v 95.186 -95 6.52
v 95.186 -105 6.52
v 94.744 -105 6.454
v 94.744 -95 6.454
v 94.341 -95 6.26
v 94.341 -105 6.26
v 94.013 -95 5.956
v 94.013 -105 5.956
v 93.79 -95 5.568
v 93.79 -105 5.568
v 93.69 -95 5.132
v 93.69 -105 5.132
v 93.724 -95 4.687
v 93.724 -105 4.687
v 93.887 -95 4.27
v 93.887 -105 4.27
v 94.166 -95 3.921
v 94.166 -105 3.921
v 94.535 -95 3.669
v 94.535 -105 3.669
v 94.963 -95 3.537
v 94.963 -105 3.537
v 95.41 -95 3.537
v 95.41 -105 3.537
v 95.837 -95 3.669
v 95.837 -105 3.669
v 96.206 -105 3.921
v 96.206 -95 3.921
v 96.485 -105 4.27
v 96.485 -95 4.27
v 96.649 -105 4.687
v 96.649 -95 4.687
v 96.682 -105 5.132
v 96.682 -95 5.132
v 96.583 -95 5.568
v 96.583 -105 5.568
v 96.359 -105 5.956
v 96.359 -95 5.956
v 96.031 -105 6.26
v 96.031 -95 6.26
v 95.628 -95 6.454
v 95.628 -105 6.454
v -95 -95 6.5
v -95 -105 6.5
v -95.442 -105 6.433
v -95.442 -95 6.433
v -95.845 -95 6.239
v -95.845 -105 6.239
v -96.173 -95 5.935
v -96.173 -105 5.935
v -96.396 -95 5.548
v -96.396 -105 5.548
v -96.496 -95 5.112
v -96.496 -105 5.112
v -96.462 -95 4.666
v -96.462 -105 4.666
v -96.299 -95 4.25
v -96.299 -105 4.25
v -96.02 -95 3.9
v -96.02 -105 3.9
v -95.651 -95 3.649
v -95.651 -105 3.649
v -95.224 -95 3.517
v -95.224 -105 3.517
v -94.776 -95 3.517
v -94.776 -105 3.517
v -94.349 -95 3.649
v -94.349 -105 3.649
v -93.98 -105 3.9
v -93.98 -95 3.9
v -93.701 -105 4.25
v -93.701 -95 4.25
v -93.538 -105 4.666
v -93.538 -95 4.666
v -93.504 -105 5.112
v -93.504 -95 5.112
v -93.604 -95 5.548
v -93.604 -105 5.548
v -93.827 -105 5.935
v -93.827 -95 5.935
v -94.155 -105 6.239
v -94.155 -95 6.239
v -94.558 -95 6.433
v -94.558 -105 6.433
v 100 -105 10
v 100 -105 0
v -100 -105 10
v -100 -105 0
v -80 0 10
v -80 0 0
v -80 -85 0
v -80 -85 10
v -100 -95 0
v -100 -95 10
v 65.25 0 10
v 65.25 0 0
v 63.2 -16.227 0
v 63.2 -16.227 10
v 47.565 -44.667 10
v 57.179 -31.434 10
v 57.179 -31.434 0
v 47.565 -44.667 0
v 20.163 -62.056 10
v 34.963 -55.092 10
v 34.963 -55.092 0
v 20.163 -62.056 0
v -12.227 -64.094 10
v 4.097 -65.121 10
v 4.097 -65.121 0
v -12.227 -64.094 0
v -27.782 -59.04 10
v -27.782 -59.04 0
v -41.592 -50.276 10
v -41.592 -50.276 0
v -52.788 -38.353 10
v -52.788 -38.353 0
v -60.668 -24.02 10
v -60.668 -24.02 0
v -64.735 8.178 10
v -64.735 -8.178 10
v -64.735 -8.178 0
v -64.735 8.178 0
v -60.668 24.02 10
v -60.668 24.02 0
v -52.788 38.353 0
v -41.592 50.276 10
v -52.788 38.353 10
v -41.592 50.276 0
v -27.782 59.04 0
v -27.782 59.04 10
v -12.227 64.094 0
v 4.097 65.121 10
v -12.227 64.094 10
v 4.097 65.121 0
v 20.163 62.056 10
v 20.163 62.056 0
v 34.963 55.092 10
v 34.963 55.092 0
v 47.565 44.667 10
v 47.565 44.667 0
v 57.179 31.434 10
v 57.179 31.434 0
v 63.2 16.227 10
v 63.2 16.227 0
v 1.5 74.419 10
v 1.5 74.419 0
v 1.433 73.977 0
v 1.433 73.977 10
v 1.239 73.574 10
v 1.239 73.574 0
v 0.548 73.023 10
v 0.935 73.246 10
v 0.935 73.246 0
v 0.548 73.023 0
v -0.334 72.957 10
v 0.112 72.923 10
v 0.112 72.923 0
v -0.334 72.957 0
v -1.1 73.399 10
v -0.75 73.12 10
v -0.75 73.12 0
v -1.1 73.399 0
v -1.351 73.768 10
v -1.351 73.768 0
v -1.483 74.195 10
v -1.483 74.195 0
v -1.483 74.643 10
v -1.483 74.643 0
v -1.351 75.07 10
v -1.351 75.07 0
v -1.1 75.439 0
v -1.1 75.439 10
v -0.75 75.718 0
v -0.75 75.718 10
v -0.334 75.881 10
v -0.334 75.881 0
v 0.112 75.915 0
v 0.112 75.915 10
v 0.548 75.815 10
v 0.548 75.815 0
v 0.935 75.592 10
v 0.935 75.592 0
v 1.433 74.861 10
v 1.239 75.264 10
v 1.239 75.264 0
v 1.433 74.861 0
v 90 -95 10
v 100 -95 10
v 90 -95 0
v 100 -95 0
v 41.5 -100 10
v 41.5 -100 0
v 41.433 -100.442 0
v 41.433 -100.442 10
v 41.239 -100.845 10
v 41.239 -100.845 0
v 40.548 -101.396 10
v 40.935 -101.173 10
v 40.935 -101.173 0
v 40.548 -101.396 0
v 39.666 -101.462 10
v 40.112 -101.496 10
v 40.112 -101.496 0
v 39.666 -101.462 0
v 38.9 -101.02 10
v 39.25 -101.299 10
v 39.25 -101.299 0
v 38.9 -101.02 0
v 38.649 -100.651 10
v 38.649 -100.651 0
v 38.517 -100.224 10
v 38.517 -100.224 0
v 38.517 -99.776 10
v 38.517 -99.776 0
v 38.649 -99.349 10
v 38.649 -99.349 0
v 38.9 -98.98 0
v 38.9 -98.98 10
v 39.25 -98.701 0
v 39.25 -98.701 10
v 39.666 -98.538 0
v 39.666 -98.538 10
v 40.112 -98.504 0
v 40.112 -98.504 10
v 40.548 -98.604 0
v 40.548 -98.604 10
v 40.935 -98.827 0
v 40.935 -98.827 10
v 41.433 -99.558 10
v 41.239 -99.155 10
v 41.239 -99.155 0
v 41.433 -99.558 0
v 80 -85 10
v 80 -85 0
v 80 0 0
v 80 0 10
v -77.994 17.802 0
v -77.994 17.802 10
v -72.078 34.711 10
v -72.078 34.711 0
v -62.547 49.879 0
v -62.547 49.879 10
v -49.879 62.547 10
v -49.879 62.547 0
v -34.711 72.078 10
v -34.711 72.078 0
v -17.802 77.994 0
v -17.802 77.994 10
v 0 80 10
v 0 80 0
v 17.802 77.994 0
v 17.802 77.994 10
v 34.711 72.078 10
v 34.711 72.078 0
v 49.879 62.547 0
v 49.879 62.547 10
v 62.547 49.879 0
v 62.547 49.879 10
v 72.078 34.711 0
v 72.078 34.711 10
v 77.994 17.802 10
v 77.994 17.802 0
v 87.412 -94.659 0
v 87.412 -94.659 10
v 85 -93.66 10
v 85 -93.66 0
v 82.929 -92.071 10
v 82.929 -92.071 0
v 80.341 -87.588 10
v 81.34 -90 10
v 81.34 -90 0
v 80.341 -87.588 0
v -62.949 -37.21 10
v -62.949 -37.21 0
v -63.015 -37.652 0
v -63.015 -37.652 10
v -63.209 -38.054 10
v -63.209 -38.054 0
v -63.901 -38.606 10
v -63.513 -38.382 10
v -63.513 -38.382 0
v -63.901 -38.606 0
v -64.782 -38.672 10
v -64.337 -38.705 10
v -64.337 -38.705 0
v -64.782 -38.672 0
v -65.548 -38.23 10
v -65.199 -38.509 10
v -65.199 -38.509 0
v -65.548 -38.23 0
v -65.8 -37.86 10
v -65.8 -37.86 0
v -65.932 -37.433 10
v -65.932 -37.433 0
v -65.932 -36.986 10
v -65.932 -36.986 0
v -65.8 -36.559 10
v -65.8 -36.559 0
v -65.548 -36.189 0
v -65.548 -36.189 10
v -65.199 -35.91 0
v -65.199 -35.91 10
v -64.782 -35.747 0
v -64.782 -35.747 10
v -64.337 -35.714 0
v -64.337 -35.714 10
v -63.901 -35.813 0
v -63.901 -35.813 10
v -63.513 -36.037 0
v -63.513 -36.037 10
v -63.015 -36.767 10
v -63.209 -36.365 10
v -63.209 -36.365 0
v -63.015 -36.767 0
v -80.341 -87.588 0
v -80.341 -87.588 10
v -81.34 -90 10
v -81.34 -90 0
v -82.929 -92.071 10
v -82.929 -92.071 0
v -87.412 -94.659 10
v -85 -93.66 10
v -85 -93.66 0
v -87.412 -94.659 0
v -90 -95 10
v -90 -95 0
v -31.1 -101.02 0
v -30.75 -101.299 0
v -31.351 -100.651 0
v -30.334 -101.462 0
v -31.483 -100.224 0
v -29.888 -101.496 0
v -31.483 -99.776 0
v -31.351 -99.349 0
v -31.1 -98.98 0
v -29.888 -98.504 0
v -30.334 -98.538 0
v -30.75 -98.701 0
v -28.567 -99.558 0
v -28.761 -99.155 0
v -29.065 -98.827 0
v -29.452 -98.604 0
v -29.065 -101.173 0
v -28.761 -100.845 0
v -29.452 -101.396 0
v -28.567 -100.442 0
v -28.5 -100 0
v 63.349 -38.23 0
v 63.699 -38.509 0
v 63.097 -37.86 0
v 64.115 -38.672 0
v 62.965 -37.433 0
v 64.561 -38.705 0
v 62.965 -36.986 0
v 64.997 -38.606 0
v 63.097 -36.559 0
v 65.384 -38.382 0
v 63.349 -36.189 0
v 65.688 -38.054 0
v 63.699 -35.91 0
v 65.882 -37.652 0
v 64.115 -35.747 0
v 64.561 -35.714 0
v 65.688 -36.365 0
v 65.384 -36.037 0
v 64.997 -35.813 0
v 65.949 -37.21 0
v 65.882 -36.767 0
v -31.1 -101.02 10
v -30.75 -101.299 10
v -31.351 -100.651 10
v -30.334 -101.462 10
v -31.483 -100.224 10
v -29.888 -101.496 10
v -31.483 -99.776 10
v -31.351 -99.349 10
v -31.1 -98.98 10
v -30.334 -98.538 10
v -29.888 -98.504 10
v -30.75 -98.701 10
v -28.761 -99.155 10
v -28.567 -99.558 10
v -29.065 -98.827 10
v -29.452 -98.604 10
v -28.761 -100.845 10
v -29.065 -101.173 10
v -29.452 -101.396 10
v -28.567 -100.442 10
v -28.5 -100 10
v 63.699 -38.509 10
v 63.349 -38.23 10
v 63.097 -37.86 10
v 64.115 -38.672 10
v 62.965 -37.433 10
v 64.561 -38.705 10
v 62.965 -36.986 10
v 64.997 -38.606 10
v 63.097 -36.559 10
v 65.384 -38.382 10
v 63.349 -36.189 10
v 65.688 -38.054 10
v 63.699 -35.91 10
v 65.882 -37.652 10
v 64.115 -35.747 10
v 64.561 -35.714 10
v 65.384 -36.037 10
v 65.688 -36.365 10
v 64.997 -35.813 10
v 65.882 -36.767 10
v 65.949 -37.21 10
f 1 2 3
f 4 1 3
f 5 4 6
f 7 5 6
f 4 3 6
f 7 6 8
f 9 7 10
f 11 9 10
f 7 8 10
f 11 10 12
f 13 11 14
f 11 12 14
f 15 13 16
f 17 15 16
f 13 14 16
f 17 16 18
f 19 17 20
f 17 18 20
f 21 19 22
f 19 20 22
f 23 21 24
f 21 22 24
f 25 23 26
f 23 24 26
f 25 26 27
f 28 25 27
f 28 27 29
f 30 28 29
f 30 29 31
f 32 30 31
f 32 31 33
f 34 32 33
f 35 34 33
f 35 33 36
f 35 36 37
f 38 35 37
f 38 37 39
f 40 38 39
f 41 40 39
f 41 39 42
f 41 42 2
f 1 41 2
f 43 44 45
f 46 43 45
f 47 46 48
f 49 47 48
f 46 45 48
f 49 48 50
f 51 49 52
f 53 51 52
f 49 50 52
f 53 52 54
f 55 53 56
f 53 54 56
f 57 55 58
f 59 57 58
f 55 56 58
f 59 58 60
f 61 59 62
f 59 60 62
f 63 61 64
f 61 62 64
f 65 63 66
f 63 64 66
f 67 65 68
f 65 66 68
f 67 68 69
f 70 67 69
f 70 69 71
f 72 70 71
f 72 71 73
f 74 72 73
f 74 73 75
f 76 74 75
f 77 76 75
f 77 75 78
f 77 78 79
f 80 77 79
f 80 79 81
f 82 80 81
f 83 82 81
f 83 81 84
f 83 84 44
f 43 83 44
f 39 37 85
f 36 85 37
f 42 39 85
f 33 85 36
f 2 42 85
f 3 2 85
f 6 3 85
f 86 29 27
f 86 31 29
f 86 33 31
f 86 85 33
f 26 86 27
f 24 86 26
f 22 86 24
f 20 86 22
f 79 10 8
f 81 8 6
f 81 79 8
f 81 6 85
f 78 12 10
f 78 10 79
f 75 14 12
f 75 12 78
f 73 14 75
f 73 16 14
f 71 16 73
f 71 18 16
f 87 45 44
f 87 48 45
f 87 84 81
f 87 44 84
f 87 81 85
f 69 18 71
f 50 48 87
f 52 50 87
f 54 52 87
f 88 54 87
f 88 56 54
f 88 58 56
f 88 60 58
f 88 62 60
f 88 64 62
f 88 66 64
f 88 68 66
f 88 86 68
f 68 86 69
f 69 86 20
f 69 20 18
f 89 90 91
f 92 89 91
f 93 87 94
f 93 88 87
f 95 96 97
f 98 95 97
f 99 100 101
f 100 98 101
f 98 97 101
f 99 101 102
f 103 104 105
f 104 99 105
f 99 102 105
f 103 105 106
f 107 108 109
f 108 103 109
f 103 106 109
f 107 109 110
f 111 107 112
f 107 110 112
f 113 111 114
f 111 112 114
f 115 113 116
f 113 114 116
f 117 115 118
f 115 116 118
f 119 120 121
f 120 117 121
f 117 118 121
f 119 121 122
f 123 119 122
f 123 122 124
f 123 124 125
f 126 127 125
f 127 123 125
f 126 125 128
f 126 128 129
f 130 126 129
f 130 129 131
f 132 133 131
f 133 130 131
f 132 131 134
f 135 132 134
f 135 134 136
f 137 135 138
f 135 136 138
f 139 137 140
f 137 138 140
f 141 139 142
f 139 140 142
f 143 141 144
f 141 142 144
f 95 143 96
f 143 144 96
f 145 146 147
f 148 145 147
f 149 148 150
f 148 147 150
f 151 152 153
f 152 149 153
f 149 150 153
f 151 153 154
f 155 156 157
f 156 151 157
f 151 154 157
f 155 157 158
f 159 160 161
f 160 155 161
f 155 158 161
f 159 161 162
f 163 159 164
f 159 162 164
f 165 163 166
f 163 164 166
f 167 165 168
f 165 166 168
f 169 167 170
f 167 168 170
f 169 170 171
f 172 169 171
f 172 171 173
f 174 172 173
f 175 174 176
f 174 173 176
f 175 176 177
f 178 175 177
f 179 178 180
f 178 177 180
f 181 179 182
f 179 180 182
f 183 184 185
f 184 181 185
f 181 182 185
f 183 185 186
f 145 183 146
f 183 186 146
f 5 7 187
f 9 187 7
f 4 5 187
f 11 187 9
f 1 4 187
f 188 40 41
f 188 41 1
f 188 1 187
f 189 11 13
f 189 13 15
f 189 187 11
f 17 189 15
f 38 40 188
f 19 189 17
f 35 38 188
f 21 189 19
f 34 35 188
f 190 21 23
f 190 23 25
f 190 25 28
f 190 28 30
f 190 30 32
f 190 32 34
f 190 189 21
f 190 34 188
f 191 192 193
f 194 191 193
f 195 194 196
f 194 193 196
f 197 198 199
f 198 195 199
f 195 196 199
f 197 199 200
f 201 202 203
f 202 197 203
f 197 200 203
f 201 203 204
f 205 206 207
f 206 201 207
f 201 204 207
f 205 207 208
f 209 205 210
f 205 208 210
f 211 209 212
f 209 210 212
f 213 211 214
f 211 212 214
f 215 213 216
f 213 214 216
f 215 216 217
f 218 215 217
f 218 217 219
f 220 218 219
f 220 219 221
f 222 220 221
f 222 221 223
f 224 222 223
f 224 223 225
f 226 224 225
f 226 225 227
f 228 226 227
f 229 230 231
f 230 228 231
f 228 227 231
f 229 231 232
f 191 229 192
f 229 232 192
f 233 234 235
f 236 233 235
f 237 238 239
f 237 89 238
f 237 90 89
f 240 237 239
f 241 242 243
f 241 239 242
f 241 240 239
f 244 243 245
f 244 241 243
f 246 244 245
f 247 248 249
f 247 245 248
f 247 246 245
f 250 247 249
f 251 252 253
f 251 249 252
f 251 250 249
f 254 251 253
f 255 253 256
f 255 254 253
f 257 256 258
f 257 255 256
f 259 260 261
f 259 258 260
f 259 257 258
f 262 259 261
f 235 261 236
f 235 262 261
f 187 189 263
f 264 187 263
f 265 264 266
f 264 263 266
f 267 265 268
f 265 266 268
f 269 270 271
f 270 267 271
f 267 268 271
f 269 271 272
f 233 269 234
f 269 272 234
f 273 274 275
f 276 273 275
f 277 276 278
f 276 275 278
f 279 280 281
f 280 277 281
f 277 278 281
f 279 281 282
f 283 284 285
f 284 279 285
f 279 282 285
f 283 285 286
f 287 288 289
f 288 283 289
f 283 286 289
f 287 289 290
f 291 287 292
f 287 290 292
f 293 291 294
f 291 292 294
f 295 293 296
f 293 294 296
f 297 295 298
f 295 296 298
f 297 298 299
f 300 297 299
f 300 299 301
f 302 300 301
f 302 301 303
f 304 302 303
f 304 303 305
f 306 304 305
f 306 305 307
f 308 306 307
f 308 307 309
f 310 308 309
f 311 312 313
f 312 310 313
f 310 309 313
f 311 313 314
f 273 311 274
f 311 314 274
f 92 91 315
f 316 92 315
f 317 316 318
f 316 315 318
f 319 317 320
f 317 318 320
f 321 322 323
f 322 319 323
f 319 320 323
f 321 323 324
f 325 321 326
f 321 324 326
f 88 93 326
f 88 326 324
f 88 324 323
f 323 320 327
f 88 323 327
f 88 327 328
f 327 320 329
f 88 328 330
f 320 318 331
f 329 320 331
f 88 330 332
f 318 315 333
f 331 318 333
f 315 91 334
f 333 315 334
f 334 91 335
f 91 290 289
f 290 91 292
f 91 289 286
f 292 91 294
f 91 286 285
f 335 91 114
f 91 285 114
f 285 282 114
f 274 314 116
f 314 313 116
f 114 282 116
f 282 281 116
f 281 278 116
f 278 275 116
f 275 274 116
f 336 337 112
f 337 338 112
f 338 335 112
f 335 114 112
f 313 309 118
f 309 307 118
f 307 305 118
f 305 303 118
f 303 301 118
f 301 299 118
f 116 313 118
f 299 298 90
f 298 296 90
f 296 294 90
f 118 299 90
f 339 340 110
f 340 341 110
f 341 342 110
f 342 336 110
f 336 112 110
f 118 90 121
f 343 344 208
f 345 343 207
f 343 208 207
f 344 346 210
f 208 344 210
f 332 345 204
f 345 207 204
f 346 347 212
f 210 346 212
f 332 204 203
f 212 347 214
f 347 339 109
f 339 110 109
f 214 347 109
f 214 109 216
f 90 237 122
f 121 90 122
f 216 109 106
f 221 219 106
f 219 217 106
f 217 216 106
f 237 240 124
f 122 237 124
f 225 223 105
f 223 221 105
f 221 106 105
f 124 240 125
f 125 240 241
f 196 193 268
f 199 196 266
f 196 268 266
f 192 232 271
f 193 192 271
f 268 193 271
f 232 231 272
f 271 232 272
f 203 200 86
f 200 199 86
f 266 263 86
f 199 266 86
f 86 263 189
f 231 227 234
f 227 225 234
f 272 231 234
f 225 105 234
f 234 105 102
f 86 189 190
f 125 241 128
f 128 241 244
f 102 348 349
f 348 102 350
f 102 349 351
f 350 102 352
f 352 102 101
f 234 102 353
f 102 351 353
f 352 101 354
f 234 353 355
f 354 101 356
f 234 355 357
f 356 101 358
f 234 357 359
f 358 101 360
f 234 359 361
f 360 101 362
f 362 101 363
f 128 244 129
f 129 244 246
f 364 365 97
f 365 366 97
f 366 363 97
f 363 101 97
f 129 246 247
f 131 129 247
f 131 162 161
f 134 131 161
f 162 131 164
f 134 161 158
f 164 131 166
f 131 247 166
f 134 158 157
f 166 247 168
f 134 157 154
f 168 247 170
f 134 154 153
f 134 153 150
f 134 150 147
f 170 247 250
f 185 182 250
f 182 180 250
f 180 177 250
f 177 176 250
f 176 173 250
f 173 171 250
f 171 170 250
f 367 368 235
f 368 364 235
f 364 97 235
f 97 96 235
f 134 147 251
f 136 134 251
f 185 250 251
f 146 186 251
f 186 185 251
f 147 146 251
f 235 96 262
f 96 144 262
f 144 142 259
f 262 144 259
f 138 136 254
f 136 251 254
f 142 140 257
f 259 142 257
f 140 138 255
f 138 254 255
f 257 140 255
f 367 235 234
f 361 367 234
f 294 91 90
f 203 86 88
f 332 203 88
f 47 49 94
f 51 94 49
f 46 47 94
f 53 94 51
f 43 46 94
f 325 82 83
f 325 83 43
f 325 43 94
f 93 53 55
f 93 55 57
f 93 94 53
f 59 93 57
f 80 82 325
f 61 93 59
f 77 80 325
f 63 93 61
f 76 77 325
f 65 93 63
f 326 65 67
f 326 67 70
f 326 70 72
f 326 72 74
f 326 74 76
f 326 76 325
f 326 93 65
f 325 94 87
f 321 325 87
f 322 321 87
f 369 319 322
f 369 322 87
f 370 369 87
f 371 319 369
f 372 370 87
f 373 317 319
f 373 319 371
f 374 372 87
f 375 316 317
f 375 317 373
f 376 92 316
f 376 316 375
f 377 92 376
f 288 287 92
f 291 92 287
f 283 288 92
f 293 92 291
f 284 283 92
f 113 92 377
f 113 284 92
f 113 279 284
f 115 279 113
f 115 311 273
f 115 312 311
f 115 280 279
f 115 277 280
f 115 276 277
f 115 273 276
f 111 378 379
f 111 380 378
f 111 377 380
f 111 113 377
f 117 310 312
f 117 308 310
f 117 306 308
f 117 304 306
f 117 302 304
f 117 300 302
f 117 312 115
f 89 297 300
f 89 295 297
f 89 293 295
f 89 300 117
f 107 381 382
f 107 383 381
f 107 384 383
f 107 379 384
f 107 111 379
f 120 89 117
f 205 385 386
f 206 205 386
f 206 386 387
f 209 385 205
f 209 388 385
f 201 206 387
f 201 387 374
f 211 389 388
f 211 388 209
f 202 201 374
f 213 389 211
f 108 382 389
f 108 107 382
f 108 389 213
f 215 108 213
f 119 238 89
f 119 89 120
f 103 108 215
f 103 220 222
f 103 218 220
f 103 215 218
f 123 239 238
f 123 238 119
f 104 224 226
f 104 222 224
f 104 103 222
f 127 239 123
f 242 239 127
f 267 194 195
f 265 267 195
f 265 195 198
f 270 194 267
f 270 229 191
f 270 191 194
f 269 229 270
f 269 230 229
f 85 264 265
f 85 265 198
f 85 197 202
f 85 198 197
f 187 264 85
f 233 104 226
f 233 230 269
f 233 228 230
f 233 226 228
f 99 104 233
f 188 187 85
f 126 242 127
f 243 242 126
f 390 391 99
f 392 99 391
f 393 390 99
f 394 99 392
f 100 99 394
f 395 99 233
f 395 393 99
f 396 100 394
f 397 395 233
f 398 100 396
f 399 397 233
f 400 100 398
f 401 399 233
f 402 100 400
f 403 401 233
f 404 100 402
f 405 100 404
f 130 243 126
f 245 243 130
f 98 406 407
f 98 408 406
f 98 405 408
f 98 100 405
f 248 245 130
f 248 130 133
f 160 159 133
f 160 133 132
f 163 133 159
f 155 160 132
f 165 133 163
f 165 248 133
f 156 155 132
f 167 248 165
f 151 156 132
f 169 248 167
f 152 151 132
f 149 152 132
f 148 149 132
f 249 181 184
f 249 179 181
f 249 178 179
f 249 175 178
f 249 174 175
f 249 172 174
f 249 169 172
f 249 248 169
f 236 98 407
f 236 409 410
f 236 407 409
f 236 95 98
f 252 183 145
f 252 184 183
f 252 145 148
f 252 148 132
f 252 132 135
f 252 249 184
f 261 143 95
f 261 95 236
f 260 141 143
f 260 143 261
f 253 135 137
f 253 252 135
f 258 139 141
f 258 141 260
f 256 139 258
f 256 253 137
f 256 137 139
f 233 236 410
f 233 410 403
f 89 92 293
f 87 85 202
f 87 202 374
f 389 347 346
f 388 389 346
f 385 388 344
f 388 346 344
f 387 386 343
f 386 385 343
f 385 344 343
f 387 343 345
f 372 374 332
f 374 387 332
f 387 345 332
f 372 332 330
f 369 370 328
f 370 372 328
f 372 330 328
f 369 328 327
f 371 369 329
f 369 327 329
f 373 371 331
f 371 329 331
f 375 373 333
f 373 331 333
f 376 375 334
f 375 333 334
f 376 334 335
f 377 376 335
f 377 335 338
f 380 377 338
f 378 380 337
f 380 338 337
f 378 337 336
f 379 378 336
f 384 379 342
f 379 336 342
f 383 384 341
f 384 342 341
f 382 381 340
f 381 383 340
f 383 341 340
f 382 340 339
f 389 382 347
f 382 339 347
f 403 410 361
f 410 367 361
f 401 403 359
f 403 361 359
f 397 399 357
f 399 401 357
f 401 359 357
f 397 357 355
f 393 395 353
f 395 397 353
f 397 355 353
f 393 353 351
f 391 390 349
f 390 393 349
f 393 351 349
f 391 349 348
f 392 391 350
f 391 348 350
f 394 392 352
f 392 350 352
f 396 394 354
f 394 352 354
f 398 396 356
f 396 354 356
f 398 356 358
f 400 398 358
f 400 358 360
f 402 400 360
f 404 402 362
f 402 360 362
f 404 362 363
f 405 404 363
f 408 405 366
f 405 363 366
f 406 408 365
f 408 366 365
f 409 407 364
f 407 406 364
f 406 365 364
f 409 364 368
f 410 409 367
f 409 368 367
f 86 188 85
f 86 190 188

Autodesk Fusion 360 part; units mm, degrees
sketch "Sketch1" plane through (0, 0, 0) normal (0, 0, 1) x (1, 0, 0)
  circle A0 centre (0, 0) radius 65.25
  circle A1 centre (0, 0) radius 74.419 construction
  circle A2 centre (0, 74.419) radius 1.5
  circle A3 centre (-64.4487, -37.2095) radius 1.5
  circle A4 centre (64.4487, -37.2095) radius 1.5
  circle A5 centre (0, 0) radius 80
  line L0 (-80, 0) -> (80, 0) construction
  line L1 (-80, 0) -> (-80, -85)
  line L2 (80, -85) -> (80, 0)
  line L3 (-80, -95) -> (-100, -95) construction
  line L4 (-100, -95) -> (-90, -95)
  line L5 (100, -95) -> (100, -105)
  line L6 (100, -105) -> (-100, -105)
  line L7 (-100, -105) -> (-100, -95)
  arc A6 (-90, -95) -> (-80, -85) centre (-90, -85) ccw
  line L8 (90, -95) -> (100, -95)
  arc A7 (80, -85) -> (90, -95) centre (90, -85) ccw
  line L9 (-100, -100) -> (-30, -100) construction
  line L10 (-100, -100) -> (40, -100) construction
  circle A8 centre (-30, -100) radius 1.5
  circle A9 centre (40, -100) radius 1.5
  dimension "d1" = 130.5
  dimension "d4" = 148.838
  dimension "d5" = 3
  dimension "d7" = 360
  dimension "d8" = 160
  dimension "d10" = 200
  dimension "d11" = 10
  dimension "d12" = 10
  dimension "d13" = 10
  dimension "d22" = 105
  dimension "d24" = 70
  dimension "d25" = 140
  dimension "d26" = 3
  dimension "d27" = 3
extrude "Extrude1" add sketch "Sketch1" along normal blind 10
hole "Hole1" at (-95, -95, 5) direction (0, -1, 0) diameter 3 depth 10 tip angle 118
hole "Hole2" at (95.1862, -95, 5.0204) direction (0, -1, 0) diameter 3 depth 10 tip angle 118
equation "d1 = GearboxDia + Tollerance"
equation "GearboxDia = 130 mm"
equation "Tollerance = 0.5 mm"
equation "d4 = ( 74.419 * 2 ) * 1 mm"
equation "d8 = GearboxDia + 30 mm"
equation "d10 = d8 + 40 mm"
equation "d22 = AxleHieght"
equation "AxleHieght = 105 mm"
equation "d24 = ( 210 / 3 ) * 1 mm"
equation "d25 = ( 210 / 3 * 2 ) * 1 mm"
